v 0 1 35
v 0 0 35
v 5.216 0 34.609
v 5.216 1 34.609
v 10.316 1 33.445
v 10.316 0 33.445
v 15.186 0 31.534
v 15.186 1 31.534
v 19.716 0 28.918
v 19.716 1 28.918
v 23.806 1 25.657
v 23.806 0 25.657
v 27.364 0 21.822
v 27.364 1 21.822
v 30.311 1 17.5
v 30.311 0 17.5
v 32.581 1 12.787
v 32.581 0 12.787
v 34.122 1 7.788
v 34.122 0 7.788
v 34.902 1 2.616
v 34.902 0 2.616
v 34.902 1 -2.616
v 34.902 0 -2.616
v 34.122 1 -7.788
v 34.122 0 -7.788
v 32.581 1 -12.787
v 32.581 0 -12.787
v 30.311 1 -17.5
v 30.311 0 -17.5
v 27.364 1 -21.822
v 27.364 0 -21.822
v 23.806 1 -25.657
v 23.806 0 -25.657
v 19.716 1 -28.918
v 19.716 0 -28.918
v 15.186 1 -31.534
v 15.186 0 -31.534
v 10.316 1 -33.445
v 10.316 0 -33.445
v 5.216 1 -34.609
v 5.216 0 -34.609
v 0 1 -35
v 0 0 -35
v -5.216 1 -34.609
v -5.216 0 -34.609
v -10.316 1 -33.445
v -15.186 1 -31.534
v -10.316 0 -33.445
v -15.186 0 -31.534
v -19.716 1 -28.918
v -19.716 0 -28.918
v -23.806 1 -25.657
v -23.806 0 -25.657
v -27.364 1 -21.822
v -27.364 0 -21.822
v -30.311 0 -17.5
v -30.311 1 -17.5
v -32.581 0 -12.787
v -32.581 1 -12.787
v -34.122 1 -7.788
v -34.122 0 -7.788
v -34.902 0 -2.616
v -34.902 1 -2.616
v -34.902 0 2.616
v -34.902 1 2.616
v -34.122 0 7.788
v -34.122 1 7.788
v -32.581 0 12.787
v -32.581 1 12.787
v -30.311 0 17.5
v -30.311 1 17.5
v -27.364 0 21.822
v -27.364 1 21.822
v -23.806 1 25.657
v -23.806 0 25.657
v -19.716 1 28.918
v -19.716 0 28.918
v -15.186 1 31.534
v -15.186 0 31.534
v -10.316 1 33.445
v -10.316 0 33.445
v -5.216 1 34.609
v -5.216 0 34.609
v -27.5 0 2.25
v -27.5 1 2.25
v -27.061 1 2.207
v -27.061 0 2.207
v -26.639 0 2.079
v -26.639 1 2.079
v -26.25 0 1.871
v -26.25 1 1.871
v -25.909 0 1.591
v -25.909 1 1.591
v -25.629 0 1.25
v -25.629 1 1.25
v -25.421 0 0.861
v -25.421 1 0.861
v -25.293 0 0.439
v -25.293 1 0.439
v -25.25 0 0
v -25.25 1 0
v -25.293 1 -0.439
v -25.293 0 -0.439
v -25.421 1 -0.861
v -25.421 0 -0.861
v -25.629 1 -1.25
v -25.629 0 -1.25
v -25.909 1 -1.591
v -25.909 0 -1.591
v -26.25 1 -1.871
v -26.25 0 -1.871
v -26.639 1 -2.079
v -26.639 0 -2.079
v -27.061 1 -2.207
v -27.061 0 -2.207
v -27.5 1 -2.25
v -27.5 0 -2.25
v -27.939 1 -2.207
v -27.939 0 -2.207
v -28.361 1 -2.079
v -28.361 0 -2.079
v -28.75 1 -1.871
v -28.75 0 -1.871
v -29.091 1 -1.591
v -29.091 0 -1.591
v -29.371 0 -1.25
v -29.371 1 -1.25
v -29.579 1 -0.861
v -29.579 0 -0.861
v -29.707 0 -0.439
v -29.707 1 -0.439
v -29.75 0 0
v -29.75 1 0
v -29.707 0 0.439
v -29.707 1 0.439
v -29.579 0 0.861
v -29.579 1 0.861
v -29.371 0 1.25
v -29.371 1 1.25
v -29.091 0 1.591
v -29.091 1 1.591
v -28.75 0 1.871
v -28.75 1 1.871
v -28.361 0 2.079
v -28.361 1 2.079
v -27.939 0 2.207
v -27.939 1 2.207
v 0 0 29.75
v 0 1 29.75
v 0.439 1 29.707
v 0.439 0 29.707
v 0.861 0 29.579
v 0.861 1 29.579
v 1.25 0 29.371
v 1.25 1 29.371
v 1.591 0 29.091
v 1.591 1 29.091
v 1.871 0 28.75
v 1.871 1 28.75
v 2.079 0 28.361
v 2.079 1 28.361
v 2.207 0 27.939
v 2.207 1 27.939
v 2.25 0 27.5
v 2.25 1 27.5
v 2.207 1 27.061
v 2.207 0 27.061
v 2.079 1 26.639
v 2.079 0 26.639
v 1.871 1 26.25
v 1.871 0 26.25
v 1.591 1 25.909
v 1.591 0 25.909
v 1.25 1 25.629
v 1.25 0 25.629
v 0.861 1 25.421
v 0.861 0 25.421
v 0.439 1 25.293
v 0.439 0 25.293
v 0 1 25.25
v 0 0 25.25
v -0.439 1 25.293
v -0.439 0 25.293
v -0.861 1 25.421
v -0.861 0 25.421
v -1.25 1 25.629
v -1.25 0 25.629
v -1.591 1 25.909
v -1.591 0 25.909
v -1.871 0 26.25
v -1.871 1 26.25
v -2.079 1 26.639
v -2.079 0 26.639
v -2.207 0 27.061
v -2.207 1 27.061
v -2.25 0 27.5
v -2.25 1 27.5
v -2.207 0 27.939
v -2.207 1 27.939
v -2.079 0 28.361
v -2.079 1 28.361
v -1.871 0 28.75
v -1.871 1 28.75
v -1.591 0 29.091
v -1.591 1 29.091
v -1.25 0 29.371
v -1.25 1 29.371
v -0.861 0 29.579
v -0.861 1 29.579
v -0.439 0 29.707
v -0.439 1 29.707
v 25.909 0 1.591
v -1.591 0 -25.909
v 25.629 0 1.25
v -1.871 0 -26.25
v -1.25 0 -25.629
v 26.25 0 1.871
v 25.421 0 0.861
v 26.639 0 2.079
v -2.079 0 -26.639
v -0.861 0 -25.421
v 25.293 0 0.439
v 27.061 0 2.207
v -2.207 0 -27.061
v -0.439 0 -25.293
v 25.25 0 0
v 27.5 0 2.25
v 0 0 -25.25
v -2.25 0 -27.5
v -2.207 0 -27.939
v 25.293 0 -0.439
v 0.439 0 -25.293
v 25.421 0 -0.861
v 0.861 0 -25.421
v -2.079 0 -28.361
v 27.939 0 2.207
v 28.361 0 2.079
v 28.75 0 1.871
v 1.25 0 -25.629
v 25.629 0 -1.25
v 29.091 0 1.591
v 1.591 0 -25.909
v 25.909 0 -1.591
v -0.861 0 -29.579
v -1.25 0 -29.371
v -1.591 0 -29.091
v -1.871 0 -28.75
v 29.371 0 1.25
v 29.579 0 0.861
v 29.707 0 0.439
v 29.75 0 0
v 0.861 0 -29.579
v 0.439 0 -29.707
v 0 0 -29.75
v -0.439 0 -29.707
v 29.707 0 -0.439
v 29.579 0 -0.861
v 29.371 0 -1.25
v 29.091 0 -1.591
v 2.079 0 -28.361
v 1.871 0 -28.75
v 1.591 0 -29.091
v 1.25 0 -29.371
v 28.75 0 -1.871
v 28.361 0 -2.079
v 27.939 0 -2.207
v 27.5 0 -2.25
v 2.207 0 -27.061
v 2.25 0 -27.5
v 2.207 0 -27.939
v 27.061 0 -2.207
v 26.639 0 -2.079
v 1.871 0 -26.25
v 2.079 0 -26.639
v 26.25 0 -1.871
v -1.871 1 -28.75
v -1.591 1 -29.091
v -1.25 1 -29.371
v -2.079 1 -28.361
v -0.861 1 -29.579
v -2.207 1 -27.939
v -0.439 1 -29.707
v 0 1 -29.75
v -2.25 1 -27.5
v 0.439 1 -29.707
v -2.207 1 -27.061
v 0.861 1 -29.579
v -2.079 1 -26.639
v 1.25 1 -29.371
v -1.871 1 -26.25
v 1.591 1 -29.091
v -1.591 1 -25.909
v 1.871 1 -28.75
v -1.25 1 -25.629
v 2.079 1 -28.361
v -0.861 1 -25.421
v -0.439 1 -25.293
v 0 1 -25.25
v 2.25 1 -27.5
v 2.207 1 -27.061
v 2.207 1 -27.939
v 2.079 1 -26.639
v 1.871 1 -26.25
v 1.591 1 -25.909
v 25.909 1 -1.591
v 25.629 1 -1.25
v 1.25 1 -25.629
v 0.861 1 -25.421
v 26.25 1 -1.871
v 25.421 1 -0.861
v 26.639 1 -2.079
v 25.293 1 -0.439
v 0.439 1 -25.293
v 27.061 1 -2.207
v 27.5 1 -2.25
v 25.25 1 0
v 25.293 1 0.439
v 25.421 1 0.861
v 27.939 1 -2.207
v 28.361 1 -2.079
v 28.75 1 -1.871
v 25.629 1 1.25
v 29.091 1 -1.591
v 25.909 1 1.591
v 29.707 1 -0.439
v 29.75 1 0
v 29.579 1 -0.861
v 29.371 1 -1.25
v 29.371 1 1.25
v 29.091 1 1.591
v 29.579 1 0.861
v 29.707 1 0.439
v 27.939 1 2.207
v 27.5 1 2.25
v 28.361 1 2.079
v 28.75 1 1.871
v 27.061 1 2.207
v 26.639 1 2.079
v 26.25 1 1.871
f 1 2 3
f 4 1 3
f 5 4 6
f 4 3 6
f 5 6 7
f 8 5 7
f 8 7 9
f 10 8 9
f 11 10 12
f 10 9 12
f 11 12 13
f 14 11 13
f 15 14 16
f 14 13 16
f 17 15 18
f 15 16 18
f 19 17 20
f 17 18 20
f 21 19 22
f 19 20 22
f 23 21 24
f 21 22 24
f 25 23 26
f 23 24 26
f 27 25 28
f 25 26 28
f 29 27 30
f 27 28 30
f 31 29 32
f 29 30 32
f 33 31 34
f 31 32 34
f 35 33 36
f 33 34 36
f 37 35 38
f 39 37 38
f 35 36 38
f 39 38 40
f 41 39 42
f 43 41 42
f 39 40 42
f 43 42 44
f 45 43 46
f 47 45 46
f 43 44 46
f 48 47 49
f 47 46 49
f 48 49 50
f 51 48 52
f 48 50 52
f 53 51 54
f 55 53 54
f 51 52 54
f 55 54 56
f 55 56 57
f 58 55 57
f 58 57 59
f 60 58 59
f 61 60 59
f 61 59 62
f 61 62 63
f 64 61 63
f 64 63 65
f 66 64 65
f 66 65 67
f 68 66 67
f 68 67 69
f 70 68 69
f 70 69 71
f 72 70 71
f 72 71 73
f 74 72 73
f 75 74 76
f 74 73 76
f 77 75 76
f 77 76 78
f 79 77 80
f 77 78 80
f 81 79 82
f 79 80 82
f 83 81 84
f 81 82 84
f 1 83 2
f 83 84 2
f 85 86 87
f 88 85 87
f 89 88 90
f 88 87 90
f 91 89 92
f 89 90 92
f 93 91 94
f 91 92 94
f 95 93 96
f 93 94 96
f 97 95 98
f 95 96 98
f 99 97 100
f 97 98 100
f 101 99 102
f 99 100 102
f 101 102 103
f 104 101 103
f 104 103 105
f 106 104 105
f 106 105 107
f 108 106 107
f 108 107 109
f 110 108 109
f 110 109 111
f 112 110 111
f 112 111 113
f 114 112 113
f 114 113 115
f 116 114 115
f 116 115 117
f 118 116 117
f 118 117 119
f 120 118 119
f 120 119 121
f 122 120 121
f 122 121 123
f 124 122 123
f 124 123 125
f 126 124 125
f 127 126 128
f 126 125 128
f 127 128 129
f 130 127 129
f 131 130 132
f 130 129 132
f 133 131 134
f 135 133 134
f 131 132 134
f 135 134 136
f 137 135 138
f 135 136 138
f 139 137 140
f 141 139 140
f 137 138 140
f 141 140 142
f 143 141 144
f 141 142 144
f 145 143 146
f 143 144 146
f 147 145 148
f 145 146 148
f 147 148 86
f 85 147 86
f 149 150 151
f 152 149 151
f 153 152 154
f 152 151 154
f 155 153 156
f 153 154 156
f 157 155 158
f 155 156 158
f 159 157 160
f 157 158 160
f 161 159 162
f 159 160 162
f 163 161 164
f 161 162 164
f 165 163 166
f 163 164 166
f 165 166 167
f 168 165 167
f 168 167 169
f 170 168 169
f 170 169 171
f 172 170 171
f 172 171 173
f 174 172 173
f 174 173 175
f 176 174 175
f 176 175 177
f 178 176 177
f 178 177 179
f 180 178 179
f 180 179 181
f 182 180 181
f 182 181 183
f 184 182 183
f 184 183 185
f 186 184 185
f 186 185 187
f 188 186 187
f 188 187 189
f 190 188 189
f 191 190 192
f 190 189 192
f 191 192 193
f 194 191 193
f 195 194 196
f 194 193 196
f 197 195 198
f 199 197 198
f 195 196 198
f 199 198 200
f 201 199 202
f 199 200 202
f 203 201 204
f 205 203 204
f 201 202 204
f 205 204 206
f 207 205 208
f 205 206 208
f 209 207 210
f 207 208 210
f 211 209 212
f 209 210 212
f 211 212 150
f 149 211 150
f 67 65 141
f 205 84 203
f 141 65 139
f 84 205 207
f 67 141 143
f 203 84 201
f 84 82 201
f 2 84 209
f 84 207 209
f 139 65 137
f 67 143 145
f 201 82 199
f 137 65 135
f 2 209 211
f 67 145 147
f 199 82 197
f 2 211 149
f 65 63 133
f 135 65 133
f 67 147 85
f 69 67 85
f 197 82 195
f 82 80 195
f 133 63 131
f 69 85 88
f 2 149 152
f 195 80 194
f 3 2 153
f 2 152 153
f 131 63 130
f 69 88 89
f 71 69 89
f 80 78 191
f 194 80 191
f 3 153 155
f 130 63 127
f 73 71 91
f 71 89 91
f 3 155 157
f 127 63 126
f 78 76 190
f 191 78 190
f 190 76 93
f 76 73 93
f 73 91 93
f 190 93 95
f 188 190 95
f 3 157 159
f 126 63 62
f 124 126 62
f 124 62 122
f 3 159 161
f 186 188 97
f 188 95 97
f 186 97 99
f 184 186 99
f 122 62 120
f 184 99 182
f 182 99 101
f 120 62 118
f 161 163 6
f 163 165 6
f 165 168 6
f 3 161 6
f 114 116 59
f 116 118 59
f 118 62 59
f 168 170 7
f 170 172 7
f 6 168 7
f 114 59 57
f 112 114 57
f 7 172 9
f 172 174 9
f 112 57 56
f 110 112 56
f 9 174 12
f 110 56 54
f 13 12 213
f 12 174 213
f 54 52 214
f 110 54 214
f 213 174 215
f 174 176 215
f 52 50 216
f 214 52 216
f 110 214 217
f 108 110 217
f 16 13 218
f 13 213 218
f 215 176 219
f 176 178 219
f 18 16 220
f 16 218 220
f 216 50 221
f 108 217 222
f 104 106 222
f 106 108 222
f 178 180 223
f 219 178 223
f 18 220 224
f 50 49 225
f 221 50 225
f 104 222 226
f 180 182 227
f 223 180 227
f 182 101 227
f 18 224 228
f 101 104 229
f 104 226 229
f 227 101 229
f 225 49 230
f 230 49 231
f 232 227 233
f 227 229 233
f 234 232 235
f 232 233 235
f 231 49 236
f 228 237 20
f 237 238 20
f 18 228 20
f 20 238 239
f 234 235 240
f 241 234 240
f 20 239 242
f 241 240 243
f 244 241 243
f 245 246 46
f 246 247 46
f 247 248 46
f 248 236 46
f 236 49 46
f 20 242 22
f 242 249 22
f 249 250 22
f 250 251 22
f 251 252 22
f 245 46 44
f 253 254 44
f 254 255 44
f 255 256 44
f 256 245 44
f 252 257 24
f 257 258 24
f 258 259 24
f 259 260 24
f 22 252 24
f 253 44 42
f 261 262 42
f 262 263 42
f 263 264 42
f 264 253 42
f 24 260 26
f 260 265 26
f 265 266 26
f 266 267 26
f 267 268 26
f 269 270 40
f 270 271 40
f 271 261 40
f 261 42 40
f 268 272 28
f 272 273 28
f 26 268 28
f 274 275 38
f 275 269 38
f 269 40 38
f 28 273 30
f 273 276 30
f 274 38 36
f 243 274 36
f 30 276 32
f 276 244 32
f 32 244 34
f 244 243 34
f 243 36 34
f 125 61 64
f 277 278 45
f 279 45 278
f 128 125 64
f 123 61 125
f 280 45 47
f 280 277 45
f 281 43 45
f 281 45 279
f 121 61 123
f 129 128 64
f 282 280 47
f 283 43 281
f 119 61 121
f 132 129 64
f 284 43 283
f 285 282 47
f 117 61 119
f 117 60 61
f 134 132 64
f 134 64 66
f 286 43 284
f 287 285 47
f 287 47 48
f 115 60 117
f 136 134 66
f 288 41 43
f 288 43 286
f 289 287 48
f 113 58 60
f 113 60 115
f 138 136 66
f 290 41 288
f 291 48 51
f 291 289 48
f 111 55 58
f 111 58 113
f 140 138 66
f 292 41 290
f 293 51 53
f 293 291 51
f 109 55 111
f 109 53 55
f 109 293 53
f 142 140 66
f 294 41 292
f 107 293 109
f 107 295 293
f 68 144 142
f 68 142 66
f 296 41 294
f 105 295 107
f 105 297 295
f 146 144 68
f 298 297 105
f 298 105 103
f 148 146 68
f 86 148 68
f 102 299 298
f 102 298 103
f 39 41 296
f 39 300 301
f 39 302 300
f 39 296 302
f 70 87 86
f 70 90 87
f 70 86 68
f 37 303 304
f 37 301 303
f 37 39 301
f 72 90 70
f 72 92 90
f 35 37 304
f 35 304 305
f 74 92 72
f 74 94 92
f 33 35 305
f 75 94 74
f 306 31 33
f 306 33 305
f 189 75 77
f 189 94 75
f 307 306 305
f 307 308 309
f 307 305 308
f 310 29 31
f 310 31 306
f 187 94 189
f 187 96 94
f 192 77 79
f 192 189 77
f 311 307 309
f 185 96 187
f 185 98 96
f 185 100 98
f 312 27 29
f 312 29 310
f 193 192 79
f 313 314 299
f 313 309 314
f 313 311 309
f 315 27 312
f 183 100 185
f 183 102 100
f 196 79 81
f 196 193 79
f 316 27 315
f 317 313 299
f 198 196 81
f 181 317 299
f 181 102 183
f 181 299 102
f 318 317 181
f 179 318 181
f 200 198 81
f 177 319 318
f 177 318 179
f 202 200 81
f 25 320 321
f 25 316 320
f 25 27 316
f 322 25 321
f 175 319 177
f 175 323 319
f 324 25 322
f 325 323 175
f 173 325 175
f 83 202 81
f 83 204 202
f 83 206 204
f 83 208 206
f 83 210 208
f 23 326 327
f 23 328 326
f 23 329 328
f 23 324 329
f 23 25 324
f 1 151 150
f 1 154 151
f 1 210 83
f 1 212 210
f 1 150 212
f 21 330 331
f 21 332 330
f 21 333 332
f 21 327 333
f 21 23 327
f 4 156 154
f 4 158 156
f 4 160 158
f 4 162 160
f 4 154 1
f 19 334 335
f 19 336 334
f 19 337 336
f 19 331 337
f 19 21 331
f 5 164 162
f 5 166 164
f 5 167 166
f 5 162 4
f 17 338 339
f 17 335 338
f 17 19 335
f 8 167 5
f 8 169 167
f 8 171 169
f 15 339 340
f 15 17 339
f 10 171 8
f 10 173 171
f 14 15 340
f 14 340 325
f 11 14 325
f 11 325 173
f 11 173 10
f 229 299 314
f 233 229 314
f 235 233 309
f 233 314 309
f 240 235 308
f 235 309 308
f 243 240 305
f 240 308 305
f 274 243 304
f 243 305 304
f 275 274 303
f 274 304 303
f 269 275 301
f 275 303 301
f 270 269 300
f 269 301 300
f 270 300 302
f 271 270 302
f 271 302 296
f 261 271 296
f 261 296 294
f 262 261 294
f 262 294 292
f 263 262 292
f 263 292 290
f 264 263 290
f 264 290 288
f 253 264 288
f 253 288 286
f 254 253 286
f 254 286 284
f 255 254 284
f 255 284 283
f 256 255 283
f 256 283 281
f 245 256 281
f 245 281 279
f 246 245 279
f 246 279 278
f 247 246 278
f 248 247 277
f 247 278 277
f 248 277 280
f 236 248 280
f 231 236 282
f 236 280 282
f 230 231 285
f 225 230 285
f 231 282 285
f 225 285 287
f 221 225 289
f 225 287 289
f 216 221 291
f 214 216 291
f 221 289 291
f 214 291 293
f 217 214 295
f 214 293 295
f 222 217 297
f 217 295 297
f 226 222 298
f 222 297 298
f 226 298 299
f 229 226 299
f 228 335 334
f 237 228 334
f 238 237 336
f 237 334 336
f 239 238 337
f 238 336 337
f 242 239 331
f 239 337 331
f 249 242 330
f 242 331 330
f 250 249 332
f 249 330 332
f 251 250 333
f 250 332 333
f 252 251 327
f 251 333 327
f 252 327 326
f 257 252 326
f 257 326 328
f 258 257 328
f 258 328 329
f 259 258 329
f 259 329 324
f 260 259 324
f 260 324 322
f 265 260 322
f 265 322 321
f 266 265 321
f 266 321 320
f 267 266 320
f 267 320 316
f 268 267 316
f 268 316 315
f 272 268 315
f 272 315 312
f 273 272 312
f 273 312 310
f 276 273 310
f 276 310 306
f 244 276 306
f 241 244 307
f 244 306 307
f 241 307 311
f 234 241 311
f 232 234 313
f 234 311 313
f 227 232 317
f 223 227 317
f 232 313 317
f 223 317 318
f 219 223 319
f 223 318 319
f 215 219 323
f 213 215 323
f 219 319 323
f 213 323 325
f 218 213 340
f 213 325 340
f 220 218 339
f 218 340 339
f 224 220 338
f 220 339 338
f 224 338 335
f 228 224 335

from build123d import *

# Parameters (mm, degrees)
SKETCH1_R           = 35
SKETCH1_R_2         = 20
BOSS_EXTRUDE1_DEPTH = 1
SKETCH3_R           = 20
BOSS_EXTRUDE2_DEPTH = 1
CUT_EXTRUDE1_REACH  = 51.508
SKETCH4_R           = 2.25


with BuildPart() as part:
    # Sketch1 → Boss-Extrude1 (new body)
    with BuildSketch(Plane(origin=(0, 0, 0), x_dir=(1, 0, 0), z_dir=(0, 1, 0))):
        with Locations(Location((0, 0, 0), (0, 0, 270))):
            Circle(SKETCH1_R)
        with Locations(Location((0, 0, 0), (0, 0, 270))):
            Circle(SKETCH1_R_2, mode=Mode.SUBTRACT)
    extrude(amount=BOSS_EXTRUDE1_DEPTH)

    # Sketch3 → Boss-Extrude2 (add)
    with BuildSketch(Plane(origin=(0, 0, 0), x_dir=(1, 0, 0), z_dir=(0, 1, 0))):
        Circle(SKETCH3_R)
    extrude(amount=BOSS_EXTRUDE2_DEPTH)

    # Sketch4 → Cut-Extrude1 (cut, up to next)
    with BuildSketch(Plane(origin=(0, 1, 0), x_dir=(1, 0, 0), z_dir=(0, 1, 0)), mode=Mode.PRIVATE) as cut_extrude1_sk1:
        with Locations(Location((0, 27.5, 0), (0, 0, 270))):
            Circle(SKETCH4_R)
    cut_extrude1_tool1 = extrude(cut_extrude1_sk1.sketch, amount=-CUT_EXTRUDE1_REACH, mode=Mode.PRIVATE) & part.part
    # Sketch4 → Cut-Extrude1 (cut, up to next)
    with BuildSketch(Plane(origin=(0, 1, 0), x_dir=(1, 0, 0), z_dir=(0, 1, 0)), mode=Mode.PRIVATE) as cut_extrude1_sk2:
        with Locations(Location((27.5, 0, 0), (0, 0, 270))):
            Circle(SKETCH4_R)
    cut_extrude1_tool2 = extrude(cut_extrude1_sk2.sketch, amount=-CUT_EXTRUDE1_REACH, mode=Mode.PRIVATE) & part.part
    # Sketch4 → Cut-Extrude1 (cut, up to next)
    with BuildSketch(Plane(origin=(0, 1, 0), x_dir=(1, 0, 0), z_dir=(0, 1, 0)), mode=Mode.PRIVATE) as cut_extrude1_sk3:
        with Locations(Location((0, -27.5, 0), (0, 0, 270))):
            Circle(SKETCH4_R)
    cut_extrude1_tool3 = extrude(cut_extrude1_sk3.sketch, amount=-CUT_EXTRUDE1_REACH, mode=Mode.PRIVATE) & part.part
    # Sketch4 → Cut-Extrude1 (cut, up to next)
    with BuildSketch(Plane(origin=(0, 1, 0), x_dir=(1, 0, 0), z_dir=(0, 1, 0)), mode=Mode.PRIVATE) as cut_extrude1_sk4:
        with Locations(Location((-27.5, 0, 0), (0, 0, 270))):
            Circle(SKETCH4_R)
    cut_extrude1_tool4 = extrude(cut_extrude1_sk4.sketch, amount=-CUT_EXTRUDE1_REACH, mode=Mode.PRIVATE) & part.part
    add(cut_extrude1_tool1.solids().sort_by_distance((0, 1, -27.5))[0], mode=Mode.SUBTRACT)
    add(cut_extrude1_tool2.solids().sort_by_distance((27.5, 1, 0))[0], mode=Mode.SUBTRACT)
    add(cut_extrude1_tool3.solids().sort_by_distance((0, 1, 27.5))[0], mode=Mode.SUBTRACT)
    add(cut_extrude1_tool4.solids().sort_by_distance((-27.5, 1, 0))[0], mode=Mode.SUBTRACT)


solid = part.part
